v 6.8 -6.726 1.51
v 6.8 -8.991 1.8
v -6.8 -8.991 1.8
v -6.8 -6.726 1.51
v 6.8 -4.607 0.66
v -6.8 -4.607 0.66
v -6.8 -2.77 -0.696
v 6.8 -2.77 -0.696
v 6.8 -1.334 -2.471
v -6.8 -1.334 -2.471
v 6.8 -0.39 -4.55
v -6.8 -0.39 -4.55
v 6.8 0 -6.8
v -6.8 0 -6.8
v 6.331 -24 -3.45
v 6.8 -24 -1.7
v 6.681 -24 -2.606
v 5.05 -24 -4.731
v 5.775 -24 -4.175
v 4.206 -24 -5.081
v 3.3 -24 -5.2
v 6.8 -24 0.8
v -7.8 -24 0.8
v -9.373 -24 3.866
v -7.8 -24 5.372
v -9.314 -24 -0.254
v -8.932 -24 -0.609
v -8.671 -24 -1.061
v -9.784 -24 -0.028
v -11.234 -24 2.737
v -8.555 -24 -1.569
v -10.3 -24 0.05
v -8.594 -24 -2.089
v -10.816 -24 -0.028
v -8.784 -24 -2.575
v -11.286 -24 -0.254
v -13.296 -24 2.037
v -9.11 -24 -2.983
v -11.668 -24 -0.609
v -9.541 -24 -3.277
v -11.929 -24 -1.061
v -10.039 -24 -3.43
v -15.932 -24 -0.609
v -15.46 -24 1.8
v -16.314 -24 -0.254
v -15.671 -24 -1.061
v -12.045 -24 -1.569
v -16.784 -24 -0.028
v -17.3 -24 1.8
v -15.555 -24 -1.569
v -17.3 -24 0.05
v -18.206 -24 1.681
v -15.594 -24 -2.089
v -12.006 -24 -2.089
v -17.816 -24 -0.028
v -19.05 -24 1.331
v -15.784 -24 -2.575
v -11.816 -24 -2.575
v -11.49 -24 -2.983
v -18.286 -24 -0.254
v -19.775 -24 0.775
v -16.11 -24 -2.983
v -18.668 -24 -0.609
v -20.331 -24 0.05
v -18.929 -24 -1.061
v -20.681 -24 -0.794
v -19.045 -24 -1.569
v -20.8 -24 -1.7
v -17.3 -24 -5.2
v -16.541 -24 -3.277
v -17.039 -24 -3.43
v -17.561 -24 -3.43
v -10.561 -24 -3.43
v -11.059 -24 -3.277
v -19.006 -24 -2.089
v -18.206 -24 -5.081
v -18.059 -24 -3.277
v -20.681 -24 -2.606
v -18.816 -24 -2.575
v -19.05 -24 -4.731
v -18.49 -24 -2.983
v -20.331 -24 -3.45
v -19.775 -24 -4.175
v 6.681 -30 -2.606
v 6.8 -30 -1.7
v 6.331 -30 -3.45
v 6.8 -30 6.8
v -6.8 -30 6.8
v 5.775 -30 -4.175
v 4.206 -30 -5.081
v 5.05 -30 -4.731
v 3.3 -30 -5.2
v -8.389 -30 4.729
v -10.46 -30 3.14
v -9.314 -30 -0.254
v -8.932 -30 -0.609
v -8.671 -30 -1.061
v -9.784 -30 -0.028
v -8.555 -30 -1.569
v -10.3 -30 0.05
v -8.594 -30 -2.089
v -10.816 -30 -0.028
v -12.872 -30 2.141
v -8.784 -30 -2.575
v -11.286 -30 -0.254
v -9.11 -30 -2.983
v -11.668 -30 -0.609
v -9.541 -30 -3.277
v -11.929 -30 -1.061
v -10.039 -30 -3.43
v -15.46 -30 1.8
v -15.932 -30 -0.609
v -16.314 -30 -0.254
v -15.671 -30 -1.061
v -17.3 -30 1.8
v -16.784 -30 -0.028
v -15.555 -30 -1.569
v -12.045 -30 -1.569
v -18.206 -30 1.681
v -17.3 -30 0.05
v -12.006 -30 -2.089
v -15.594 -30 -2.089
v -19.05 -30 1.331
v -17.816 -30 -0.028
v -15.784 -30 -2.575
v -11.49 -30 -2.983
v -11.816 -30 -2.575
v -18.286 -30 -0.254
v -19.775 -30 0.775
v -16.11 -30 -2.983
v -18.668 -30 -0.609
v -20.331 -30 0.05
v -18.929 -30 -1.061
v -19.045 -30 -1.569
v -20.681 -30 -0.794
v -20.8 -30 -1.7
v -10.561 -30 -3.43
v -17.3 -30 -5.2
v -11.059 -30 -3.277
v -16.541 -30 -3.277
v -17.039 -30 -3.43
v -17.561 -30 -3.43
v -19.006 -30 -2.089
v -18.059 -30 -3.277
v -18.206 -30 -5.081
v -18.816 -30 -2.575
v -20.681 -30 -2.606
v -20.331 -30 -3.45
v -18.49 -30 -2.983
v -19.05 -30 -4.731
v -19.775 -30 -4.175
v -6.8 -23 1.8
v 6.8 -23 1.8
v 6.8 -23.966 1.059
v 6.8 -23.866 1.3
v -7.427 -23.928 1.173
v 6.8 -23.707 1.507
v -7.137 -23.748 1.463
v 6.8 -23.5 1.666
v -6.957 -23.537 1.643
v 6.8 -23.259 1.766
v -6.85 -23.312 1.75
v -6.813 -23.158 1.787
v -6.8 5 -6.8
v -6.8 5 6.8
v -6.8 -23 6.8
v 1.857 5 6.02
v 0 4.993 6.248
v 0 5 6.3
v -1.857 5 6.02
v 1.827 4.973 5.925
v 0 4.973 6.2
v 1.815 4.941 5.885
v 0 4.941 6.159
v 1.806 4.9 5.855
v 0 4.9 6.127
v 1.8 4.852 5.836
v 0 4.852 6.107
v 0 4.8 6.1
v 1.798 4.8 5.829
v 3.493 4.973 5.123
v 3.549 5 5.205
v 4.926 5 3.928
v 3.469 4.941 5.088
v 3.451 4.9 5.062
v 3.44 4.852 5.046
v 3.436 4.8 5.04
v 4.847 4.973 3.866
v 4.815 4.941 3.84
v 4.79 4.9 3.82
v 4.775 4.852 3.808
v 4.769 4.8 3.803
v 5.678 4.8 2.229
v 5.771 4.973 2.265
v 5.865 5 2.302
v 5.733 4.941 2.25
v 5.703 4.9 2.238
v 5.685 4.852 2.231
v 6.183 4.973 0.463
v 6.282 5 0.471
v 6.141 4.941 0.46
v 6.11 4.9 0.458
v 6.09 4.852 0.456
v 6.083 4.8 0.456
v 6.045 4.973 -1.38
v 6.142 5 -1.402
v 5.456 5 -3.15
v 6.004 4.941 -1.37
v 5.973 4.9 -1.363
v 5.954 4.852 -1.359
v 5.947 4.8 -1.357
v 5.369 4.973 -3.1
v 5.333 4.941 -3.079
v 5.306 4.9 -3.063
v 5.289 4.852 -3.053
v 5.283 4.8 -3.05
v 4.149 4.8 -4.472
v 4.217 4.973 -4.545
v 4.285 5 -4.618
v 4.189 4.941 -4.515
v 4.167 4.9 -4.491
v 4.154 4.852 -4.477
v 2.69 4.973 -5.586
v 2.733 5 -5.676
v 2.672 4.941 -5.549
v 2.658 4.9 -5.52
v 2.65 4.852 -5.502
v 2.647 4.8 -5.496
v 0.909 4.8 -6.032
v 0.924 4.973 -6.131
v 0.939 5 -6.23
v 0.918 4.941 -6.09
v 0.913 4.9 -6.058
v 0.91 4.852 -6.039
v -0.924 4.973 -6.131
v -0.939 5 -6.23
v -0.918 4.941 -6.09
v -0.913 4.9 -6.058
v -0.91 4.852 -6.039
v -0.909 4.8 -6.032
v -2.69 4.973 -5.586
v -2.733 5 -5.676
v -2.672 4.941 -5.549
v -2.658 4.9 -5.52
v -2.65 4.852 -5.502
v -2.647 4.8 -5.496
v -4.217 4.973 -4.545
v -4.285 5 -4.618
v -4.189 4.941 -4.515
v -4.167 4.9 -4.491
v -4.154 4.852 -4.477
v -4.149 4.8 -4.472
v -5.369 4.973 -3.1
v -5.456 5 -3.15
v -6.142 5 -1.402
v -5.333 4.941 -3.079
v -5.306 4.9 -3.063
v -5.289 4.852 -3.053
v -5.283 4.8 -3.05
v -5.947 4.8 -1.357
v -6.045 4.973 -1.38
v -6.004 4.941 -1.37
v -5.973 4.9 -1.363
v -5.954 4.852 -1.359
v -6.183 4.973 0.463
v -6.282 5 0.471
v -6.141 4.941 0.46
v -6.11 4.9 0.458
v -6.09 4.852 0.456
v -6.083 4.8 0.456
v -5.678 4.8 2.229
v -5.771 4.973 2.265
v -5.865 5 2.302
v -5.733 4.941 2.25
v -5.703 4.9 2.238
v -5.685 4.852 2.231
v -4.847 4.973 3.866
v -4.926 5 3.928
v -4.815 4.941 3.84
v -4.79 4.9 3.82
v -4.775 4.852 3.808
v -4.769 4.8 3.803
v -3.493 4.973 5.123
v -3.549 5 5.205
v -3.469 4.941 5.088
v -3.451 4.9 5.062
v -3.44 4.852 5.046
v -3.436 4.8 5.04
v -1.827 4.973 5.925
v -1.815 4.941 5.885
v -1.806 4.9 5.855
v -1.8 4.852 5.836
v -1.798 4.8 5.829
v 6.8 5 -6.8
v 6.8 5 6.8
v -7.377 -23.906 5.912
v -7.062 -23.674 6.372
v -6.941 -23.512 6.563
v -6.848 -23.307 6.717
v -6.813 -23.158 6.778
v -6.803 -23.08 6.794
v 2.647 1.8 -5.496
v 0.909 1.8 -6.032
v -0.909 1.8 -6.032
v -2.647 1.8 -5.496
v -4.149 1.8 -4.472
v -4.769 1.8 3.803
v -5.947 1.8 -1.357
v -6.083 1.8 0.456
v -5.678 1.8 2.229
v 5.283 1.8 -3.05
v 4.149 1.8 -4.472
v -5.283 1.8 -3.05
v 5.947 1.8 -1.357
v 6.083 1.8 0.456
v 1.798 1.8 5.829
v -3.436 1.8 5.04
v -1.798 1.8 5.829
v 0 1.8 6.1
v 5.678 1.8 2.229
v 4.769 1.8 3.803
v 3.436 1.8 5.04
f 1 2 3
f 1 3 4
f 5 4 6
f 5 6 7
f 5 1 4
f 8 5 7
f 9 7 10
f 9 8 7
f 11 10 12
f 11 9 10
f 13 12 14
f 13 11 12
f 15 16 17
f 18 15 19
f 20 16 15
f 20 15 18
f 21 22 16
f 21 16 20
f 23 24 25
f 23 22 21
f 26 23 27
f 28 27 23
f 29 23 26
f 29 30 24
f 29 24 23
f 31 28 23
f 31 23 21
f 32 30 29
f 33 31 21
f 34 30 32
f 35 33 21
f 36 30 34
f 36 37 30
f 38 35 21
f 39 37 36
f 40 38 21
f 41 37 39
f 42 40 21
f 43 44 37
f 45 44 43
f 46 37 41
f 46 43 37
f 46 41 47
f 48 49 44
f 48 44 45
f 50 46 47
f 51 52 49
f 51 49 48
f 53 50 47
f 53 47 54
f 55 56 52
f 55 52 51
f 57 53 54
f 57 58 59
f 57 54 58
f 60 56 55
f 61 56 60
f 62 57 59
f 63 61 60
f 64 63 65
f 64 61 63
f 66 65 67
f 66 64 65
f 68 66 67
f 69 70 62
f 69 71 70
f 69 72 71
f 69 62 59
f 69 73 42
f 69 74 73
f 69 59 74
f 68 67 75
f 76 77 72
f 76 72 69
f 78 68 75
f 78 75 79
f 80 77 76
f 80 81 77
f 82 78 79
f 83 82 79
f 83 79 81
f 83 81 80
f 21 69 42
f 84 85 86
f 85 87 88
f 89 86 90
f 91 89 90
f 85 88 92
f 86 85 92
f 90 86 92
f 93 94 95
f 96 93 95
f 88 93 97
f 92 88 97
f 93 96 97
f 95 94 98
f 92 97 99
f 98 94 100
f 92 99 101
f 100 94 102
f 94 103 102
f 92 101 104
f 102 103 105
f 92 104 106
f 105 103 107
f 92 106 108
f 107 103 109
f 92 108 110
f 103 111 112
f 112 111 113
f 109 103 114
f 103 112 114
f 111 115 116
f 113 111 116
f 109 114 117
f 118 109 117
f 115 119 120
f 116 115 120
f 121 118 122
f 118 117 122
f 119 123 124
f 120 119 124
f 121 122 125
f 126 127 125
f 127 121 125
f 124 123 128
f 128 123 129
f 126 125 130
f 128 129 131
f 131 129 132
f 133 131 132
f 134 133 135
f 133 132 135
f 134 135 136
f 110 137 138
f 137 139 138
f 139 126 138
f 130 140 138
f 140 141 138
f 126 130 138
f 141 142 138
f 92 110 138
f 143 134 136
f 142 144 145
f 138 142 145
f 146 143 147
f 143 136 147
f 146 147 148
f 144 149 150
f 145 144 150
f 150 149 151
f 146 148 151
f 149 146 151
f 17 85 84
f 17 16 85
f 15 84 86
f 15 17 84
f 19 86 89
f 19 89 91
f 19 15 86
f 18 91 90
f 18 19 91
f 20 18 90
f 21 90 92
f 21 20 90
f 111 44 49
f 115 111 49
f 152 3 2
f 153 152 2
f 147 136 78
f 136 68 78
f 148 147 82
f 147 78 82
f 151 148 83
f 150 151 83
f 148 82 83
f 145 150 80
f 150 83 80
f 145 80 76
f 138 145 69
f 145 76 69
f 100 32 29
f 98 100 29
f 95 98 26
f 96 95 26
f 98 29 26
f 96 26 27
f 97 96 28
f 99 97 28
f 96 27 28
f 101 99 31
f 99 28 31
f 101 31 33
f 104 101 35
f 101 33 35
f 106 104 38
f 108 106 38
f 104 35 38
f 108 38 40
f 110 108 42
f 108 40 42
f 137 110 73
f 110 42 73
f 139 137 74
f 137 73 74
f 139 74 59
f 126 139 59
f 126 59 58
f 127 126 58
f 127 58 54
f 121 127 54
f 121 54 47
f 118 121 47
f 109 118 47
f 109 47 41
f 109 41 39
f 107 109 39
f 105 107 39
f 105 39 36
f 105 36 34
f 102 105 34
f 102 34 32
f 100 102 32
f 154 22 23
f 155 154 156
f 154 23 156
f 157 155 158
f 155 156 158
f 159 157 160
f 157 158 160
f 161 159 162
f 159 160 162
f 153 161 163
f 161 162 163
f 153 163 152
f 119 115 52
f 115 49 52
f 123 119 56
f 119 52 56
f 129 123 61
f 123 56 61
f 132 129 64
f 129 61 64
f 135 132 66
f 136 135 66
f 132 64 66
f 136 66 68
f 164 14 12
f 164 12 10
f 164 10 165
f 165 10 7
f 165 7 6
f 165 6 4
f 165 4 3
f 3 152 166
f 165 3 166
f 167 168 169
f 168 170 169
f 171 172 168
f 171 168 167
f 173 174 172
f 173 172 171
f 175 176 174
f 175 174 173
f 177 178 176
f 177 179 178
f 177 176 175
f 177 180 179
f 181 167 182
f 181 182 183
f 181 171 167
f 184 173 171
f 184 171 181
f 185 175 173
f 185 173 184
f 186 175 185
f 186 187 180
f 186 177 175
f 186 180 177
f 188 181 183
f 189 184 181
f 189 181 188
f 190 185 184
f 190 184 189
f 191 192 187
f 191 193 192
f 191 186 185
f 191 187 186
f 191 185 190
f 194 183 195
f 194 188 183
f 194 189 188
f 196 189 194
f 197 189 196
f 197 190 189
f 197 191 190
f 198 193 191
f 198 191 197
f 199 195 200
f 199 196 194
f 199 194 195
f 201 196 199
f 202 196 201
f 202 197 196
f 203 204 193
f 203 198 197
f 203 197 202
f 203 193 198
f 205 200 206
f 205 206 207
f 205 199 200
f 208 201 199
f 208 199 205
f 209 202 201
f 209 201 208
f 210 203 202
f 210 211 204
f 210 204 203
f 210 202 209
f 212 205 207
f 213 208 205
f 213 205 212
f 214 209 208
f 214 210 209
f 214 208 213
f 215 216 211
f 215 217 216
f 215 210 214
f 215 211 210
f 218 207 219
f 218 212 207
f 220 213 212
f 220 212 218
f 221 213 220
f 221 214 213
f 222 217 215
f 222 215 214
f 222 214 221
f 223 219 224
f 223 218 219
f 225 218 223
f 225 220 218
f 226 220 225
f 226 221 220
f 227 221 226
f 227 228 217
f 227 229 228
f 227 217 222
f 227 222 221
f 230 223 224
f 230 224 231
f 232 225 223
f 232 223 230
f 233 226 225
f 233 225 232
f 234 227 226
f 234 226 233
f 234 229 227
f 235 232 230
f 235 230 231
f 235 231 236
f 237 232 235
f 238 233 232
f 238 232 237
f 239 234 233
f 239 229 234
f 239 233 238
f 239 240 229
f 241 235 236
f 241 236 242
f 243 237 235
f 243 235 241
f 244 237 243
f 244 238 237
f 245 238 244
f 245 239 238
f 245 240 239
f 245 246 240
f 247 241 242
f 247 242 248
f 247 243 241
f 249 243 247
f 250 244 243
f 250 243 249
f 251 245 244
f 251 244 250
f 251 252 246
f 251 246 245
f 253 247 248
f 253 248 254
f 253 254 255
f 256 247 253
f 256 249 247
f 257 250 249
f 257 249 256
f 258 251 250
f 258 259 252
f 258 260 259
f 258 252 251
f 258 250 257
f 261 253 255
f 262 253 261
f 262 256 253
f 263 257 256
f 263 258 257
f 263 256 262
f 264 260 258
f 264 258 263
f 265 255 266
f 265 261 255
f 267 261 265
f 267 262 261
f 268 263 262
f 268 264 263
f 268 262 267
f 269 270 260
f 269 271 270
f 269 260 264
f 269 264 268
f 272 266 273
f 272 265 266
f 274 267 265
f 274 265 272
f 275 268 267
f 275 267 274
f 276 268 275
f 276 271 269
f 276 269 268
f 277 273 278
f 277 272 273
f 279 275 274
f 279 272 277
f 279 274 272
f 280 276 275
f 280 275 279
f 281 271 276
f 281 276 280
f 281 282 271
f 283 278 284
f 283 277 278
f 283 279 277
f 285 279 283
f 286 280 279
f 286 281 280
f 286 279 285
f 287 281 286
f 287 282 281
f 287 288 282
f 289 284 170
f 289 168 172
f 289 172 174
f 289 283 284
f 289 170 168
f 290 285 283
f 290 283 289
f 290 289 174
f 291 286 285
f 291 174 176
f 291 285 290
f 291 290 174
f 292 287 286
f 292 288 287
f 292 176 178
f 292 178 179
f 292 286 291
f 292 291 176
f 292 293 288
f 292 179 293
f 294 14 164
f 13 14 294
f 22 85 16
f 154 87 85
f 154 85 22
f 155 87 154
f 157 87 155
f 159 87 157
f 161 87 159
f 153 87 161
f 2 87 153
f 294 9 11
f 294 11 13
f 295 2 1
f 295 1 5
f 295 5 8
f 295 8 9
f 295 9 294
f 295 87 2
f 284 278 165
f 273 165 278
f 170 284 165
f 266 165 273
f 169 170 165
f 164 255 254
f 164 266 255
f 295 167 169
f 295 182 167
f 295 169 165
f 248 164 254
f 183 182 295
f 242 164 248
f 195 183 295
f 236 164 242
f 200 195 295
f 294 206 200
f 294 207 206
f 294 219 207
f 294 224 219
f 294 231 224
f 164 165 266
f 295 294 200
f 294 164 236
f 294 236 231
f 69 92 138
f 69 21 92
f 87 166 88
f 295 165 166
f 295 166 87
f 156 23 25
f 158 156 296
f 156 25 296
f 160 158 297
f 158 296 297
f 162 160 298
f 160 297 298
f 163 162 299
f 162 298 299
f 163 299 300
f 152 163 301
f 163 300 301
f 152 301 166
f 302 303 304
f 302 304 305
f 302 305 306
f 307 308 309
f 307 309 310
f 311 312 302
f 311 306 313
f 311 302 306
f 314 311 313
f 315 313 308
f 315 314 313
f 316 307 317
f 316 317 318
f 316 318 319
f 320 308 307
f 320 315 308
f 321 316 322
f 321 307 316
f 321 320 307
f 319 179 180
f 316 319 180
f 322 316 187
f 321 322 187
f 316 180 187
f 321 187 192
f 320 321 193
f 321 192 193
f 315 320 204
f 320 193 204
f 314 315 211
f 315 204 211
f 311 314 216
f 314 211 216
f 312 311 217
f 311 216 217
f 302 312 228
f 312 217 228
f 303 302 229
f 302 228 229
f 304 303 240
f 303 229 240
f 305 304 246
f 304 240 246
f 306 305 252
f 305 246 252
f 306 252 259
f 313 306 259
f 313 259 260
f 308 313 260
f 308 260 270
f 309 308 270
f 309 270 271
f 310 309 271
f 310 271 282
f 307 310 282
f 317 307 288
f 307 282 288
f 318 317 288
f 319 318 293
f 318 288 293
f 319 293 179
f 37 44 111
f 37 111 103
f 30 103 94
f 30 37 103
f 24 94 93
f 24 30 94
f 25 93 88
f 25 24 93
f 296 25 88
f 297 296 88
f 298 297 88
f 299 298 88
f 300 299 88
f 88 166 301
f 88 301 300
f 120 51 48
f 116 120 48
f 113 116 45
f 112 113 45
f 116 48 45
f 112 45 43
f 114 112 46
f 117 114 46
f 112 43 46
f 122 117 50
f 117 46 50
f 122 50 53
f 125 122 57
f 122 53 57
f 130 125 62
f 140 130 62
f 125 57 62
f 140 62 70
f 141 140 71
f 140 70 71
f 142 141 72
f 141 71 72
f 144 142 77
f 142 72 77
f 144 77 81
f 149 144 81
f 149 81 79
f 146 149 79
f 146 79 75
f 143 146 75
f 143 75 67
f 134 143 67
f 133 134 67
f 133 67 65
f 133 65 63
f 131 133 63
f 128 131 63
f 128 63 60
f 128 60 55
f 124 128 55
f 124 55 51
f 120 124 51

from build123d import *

# Parameters (mm, degrees)
SKETCH1_W           = 13.6
SKETCH1_H           = 13.6
BOSS_EXTRUDE1_DEPTH = 5
SKETCH2_R           = 6.1
CUT_EXTRUDE1_DEPTH  = 3.2
SKETCH3_W           = 13.6
SKETCH3_H           = 5
BOSS_EXTRUDE2_DEPTH = 30
FILLET1_R           = 0.2
FILLET2_R           = 9
SKETCH10_W          = 27.6
SKETCH10_H          = 6
BOSS_EXTRUDE5_DEPTH = 7
SKETCH11_R          = 1.75
CUT_EXTRUDE4_DEPTH  = 37.330152766
FILLET3_R           = 10
FILLET4_R           = 3.5
FILLET5_R           = 1


# Some blends are built 0.0001 mm under size
with BuildPart() as part:
    # Sketch1 → Boss-Extrude1 (new body)
    with BuildSketch(Plane(origin=(0, 0, 0), x_dir=(1, 0, 0), z_dir=(0, 1, 0))):
        Rectangle(SKETCH1_W, SKETCH1_H)
    extrude(amount=BOSS_EXTRUDE1_DEPTH)

    # Sketch2 → Cut-Extrude1 (cut)
    with BuildSketch(Plane(origin=(0, 5, 0), x_dir=(1, 0, 0), z_dir=(0, 1, 0))):
        with Locations(Location((0, 0, 0), (0, 0, 270))):
            Circle(SKETCH2_R)
    extrude(amount=-CUT_EXTRUDE1_DEPTH, mode=Mode.SUBTRACT)

    # Sketch3 → Boss-Extrude2 (add)
    with BuildSketch(Plane.XZ):
        with Locations((0, 4.3)):
            Rectangle(SKETCH3_W, SKETCH3_H)
    extrude(amount=BOSS_EXTRUDE2_DEPTH)

    # Fillet1
    fillet1_edges = [part.edges().sort_by_distance(p)[0] for p in [
        (0, 5, -6.1),
    ]]
    fillet(fillet1_edges, radius=FILLET1_R)

    # Fillet2
    # the kernel refuses this fillet: 9 mm, written as the material it adds along each edge
    with BuildSketch(Plane(origin=(6.8, 0, 1.8), x_dir=(0, 0, -1), z_dir=(-1, 0, 0))) as fillet2_piece_1:
        with BuildLine():
            CenterArc((9, 8.991106717), FILLET2_R, 180, 87.452681817)
            Line((0, 8.991106717), (-0.18, 8.991106717))
            Line((-0.18, 8.991106717), (-0.18, 0))
            Line((-0.18, 0), (0, -0.18))
            ThreePointArc((0, -0.18), (4.3, -0.18), (8.592, -0.179822134))
            Line((8.592, -0.179822134), (8.6, 0))
        make_face()
    extrude(amount=13.6)

    # Sketch10 → Boss-Extrude5 (add)
    with BuildSketch(Plane(origin=(0, 0, 1.8), x_dir=(-1, 0, 0), z_dir=(0, 0, -1))):
        with Locations((7, -27)):
            Rectangle(SKETCH10_W, SKETCH10_H)
    extrude(amount=BOSS_EXTRUDE5_DEPTH)

    # Sketch11 → Cut-Extrude4 (cut, through all)
    with BuildSketch(Plane(origin=(0, -24, 0), x_dir=(1, 0, 0), z_dir=(0, 1, 0))):
        with Locations(Location((-10.3, 1.7, 0), (0, 0, 270))):
            Circle(SKETCH11_R)
        with Locations(Location((-17.3, 1.7, 0), (0, 0, 270))):
            Circle(SKETCH11_R)
    extrude(amount=-CUT_EXTRUDE4_DEPTH, mode=Mode.SUBTRACT)

    # Fillet3
    # the kernel refuses this fillet: 10 mm, written as the material it adds along each edge
    with BuildSketch(Plane(origin=(-6.8, -24, 1.8), x_dir=(0, 0, 1), z_dir=(0, -1, 0))) as fillet3_piece_1:
        with BuildLine():
            CenterArc((10, 8.660254038), FILLET3_R, 180, 60)
            Line((0, 8.660254038), (0, 0))
            Line((0, 0), (5, 0))
        make_face()
    extrude(amount=6)

    # Fillet4
    fillet4_edges = [part.edges().sort_by_distance(p)[0] for p in [
        (-20.8, -27, 1.8),
        (-20.8, -27, -5.2),
        (6.8, -27, -5.2),
    ]]
    fillet(fillet4_edges, radius=FILLET4_R - 0.0001)  # a hair under: the kernel refuses the full size

    # Fillet5
    fillet5_edges = [part.edges().sort_by_distance(p)[0] for p in [
        (0, -24, 1.8),
        (-6.8, -24, 4.3),
    ]]
    fillet(fillet5_edges, radius=FILLET5_R)


solid = part.part
